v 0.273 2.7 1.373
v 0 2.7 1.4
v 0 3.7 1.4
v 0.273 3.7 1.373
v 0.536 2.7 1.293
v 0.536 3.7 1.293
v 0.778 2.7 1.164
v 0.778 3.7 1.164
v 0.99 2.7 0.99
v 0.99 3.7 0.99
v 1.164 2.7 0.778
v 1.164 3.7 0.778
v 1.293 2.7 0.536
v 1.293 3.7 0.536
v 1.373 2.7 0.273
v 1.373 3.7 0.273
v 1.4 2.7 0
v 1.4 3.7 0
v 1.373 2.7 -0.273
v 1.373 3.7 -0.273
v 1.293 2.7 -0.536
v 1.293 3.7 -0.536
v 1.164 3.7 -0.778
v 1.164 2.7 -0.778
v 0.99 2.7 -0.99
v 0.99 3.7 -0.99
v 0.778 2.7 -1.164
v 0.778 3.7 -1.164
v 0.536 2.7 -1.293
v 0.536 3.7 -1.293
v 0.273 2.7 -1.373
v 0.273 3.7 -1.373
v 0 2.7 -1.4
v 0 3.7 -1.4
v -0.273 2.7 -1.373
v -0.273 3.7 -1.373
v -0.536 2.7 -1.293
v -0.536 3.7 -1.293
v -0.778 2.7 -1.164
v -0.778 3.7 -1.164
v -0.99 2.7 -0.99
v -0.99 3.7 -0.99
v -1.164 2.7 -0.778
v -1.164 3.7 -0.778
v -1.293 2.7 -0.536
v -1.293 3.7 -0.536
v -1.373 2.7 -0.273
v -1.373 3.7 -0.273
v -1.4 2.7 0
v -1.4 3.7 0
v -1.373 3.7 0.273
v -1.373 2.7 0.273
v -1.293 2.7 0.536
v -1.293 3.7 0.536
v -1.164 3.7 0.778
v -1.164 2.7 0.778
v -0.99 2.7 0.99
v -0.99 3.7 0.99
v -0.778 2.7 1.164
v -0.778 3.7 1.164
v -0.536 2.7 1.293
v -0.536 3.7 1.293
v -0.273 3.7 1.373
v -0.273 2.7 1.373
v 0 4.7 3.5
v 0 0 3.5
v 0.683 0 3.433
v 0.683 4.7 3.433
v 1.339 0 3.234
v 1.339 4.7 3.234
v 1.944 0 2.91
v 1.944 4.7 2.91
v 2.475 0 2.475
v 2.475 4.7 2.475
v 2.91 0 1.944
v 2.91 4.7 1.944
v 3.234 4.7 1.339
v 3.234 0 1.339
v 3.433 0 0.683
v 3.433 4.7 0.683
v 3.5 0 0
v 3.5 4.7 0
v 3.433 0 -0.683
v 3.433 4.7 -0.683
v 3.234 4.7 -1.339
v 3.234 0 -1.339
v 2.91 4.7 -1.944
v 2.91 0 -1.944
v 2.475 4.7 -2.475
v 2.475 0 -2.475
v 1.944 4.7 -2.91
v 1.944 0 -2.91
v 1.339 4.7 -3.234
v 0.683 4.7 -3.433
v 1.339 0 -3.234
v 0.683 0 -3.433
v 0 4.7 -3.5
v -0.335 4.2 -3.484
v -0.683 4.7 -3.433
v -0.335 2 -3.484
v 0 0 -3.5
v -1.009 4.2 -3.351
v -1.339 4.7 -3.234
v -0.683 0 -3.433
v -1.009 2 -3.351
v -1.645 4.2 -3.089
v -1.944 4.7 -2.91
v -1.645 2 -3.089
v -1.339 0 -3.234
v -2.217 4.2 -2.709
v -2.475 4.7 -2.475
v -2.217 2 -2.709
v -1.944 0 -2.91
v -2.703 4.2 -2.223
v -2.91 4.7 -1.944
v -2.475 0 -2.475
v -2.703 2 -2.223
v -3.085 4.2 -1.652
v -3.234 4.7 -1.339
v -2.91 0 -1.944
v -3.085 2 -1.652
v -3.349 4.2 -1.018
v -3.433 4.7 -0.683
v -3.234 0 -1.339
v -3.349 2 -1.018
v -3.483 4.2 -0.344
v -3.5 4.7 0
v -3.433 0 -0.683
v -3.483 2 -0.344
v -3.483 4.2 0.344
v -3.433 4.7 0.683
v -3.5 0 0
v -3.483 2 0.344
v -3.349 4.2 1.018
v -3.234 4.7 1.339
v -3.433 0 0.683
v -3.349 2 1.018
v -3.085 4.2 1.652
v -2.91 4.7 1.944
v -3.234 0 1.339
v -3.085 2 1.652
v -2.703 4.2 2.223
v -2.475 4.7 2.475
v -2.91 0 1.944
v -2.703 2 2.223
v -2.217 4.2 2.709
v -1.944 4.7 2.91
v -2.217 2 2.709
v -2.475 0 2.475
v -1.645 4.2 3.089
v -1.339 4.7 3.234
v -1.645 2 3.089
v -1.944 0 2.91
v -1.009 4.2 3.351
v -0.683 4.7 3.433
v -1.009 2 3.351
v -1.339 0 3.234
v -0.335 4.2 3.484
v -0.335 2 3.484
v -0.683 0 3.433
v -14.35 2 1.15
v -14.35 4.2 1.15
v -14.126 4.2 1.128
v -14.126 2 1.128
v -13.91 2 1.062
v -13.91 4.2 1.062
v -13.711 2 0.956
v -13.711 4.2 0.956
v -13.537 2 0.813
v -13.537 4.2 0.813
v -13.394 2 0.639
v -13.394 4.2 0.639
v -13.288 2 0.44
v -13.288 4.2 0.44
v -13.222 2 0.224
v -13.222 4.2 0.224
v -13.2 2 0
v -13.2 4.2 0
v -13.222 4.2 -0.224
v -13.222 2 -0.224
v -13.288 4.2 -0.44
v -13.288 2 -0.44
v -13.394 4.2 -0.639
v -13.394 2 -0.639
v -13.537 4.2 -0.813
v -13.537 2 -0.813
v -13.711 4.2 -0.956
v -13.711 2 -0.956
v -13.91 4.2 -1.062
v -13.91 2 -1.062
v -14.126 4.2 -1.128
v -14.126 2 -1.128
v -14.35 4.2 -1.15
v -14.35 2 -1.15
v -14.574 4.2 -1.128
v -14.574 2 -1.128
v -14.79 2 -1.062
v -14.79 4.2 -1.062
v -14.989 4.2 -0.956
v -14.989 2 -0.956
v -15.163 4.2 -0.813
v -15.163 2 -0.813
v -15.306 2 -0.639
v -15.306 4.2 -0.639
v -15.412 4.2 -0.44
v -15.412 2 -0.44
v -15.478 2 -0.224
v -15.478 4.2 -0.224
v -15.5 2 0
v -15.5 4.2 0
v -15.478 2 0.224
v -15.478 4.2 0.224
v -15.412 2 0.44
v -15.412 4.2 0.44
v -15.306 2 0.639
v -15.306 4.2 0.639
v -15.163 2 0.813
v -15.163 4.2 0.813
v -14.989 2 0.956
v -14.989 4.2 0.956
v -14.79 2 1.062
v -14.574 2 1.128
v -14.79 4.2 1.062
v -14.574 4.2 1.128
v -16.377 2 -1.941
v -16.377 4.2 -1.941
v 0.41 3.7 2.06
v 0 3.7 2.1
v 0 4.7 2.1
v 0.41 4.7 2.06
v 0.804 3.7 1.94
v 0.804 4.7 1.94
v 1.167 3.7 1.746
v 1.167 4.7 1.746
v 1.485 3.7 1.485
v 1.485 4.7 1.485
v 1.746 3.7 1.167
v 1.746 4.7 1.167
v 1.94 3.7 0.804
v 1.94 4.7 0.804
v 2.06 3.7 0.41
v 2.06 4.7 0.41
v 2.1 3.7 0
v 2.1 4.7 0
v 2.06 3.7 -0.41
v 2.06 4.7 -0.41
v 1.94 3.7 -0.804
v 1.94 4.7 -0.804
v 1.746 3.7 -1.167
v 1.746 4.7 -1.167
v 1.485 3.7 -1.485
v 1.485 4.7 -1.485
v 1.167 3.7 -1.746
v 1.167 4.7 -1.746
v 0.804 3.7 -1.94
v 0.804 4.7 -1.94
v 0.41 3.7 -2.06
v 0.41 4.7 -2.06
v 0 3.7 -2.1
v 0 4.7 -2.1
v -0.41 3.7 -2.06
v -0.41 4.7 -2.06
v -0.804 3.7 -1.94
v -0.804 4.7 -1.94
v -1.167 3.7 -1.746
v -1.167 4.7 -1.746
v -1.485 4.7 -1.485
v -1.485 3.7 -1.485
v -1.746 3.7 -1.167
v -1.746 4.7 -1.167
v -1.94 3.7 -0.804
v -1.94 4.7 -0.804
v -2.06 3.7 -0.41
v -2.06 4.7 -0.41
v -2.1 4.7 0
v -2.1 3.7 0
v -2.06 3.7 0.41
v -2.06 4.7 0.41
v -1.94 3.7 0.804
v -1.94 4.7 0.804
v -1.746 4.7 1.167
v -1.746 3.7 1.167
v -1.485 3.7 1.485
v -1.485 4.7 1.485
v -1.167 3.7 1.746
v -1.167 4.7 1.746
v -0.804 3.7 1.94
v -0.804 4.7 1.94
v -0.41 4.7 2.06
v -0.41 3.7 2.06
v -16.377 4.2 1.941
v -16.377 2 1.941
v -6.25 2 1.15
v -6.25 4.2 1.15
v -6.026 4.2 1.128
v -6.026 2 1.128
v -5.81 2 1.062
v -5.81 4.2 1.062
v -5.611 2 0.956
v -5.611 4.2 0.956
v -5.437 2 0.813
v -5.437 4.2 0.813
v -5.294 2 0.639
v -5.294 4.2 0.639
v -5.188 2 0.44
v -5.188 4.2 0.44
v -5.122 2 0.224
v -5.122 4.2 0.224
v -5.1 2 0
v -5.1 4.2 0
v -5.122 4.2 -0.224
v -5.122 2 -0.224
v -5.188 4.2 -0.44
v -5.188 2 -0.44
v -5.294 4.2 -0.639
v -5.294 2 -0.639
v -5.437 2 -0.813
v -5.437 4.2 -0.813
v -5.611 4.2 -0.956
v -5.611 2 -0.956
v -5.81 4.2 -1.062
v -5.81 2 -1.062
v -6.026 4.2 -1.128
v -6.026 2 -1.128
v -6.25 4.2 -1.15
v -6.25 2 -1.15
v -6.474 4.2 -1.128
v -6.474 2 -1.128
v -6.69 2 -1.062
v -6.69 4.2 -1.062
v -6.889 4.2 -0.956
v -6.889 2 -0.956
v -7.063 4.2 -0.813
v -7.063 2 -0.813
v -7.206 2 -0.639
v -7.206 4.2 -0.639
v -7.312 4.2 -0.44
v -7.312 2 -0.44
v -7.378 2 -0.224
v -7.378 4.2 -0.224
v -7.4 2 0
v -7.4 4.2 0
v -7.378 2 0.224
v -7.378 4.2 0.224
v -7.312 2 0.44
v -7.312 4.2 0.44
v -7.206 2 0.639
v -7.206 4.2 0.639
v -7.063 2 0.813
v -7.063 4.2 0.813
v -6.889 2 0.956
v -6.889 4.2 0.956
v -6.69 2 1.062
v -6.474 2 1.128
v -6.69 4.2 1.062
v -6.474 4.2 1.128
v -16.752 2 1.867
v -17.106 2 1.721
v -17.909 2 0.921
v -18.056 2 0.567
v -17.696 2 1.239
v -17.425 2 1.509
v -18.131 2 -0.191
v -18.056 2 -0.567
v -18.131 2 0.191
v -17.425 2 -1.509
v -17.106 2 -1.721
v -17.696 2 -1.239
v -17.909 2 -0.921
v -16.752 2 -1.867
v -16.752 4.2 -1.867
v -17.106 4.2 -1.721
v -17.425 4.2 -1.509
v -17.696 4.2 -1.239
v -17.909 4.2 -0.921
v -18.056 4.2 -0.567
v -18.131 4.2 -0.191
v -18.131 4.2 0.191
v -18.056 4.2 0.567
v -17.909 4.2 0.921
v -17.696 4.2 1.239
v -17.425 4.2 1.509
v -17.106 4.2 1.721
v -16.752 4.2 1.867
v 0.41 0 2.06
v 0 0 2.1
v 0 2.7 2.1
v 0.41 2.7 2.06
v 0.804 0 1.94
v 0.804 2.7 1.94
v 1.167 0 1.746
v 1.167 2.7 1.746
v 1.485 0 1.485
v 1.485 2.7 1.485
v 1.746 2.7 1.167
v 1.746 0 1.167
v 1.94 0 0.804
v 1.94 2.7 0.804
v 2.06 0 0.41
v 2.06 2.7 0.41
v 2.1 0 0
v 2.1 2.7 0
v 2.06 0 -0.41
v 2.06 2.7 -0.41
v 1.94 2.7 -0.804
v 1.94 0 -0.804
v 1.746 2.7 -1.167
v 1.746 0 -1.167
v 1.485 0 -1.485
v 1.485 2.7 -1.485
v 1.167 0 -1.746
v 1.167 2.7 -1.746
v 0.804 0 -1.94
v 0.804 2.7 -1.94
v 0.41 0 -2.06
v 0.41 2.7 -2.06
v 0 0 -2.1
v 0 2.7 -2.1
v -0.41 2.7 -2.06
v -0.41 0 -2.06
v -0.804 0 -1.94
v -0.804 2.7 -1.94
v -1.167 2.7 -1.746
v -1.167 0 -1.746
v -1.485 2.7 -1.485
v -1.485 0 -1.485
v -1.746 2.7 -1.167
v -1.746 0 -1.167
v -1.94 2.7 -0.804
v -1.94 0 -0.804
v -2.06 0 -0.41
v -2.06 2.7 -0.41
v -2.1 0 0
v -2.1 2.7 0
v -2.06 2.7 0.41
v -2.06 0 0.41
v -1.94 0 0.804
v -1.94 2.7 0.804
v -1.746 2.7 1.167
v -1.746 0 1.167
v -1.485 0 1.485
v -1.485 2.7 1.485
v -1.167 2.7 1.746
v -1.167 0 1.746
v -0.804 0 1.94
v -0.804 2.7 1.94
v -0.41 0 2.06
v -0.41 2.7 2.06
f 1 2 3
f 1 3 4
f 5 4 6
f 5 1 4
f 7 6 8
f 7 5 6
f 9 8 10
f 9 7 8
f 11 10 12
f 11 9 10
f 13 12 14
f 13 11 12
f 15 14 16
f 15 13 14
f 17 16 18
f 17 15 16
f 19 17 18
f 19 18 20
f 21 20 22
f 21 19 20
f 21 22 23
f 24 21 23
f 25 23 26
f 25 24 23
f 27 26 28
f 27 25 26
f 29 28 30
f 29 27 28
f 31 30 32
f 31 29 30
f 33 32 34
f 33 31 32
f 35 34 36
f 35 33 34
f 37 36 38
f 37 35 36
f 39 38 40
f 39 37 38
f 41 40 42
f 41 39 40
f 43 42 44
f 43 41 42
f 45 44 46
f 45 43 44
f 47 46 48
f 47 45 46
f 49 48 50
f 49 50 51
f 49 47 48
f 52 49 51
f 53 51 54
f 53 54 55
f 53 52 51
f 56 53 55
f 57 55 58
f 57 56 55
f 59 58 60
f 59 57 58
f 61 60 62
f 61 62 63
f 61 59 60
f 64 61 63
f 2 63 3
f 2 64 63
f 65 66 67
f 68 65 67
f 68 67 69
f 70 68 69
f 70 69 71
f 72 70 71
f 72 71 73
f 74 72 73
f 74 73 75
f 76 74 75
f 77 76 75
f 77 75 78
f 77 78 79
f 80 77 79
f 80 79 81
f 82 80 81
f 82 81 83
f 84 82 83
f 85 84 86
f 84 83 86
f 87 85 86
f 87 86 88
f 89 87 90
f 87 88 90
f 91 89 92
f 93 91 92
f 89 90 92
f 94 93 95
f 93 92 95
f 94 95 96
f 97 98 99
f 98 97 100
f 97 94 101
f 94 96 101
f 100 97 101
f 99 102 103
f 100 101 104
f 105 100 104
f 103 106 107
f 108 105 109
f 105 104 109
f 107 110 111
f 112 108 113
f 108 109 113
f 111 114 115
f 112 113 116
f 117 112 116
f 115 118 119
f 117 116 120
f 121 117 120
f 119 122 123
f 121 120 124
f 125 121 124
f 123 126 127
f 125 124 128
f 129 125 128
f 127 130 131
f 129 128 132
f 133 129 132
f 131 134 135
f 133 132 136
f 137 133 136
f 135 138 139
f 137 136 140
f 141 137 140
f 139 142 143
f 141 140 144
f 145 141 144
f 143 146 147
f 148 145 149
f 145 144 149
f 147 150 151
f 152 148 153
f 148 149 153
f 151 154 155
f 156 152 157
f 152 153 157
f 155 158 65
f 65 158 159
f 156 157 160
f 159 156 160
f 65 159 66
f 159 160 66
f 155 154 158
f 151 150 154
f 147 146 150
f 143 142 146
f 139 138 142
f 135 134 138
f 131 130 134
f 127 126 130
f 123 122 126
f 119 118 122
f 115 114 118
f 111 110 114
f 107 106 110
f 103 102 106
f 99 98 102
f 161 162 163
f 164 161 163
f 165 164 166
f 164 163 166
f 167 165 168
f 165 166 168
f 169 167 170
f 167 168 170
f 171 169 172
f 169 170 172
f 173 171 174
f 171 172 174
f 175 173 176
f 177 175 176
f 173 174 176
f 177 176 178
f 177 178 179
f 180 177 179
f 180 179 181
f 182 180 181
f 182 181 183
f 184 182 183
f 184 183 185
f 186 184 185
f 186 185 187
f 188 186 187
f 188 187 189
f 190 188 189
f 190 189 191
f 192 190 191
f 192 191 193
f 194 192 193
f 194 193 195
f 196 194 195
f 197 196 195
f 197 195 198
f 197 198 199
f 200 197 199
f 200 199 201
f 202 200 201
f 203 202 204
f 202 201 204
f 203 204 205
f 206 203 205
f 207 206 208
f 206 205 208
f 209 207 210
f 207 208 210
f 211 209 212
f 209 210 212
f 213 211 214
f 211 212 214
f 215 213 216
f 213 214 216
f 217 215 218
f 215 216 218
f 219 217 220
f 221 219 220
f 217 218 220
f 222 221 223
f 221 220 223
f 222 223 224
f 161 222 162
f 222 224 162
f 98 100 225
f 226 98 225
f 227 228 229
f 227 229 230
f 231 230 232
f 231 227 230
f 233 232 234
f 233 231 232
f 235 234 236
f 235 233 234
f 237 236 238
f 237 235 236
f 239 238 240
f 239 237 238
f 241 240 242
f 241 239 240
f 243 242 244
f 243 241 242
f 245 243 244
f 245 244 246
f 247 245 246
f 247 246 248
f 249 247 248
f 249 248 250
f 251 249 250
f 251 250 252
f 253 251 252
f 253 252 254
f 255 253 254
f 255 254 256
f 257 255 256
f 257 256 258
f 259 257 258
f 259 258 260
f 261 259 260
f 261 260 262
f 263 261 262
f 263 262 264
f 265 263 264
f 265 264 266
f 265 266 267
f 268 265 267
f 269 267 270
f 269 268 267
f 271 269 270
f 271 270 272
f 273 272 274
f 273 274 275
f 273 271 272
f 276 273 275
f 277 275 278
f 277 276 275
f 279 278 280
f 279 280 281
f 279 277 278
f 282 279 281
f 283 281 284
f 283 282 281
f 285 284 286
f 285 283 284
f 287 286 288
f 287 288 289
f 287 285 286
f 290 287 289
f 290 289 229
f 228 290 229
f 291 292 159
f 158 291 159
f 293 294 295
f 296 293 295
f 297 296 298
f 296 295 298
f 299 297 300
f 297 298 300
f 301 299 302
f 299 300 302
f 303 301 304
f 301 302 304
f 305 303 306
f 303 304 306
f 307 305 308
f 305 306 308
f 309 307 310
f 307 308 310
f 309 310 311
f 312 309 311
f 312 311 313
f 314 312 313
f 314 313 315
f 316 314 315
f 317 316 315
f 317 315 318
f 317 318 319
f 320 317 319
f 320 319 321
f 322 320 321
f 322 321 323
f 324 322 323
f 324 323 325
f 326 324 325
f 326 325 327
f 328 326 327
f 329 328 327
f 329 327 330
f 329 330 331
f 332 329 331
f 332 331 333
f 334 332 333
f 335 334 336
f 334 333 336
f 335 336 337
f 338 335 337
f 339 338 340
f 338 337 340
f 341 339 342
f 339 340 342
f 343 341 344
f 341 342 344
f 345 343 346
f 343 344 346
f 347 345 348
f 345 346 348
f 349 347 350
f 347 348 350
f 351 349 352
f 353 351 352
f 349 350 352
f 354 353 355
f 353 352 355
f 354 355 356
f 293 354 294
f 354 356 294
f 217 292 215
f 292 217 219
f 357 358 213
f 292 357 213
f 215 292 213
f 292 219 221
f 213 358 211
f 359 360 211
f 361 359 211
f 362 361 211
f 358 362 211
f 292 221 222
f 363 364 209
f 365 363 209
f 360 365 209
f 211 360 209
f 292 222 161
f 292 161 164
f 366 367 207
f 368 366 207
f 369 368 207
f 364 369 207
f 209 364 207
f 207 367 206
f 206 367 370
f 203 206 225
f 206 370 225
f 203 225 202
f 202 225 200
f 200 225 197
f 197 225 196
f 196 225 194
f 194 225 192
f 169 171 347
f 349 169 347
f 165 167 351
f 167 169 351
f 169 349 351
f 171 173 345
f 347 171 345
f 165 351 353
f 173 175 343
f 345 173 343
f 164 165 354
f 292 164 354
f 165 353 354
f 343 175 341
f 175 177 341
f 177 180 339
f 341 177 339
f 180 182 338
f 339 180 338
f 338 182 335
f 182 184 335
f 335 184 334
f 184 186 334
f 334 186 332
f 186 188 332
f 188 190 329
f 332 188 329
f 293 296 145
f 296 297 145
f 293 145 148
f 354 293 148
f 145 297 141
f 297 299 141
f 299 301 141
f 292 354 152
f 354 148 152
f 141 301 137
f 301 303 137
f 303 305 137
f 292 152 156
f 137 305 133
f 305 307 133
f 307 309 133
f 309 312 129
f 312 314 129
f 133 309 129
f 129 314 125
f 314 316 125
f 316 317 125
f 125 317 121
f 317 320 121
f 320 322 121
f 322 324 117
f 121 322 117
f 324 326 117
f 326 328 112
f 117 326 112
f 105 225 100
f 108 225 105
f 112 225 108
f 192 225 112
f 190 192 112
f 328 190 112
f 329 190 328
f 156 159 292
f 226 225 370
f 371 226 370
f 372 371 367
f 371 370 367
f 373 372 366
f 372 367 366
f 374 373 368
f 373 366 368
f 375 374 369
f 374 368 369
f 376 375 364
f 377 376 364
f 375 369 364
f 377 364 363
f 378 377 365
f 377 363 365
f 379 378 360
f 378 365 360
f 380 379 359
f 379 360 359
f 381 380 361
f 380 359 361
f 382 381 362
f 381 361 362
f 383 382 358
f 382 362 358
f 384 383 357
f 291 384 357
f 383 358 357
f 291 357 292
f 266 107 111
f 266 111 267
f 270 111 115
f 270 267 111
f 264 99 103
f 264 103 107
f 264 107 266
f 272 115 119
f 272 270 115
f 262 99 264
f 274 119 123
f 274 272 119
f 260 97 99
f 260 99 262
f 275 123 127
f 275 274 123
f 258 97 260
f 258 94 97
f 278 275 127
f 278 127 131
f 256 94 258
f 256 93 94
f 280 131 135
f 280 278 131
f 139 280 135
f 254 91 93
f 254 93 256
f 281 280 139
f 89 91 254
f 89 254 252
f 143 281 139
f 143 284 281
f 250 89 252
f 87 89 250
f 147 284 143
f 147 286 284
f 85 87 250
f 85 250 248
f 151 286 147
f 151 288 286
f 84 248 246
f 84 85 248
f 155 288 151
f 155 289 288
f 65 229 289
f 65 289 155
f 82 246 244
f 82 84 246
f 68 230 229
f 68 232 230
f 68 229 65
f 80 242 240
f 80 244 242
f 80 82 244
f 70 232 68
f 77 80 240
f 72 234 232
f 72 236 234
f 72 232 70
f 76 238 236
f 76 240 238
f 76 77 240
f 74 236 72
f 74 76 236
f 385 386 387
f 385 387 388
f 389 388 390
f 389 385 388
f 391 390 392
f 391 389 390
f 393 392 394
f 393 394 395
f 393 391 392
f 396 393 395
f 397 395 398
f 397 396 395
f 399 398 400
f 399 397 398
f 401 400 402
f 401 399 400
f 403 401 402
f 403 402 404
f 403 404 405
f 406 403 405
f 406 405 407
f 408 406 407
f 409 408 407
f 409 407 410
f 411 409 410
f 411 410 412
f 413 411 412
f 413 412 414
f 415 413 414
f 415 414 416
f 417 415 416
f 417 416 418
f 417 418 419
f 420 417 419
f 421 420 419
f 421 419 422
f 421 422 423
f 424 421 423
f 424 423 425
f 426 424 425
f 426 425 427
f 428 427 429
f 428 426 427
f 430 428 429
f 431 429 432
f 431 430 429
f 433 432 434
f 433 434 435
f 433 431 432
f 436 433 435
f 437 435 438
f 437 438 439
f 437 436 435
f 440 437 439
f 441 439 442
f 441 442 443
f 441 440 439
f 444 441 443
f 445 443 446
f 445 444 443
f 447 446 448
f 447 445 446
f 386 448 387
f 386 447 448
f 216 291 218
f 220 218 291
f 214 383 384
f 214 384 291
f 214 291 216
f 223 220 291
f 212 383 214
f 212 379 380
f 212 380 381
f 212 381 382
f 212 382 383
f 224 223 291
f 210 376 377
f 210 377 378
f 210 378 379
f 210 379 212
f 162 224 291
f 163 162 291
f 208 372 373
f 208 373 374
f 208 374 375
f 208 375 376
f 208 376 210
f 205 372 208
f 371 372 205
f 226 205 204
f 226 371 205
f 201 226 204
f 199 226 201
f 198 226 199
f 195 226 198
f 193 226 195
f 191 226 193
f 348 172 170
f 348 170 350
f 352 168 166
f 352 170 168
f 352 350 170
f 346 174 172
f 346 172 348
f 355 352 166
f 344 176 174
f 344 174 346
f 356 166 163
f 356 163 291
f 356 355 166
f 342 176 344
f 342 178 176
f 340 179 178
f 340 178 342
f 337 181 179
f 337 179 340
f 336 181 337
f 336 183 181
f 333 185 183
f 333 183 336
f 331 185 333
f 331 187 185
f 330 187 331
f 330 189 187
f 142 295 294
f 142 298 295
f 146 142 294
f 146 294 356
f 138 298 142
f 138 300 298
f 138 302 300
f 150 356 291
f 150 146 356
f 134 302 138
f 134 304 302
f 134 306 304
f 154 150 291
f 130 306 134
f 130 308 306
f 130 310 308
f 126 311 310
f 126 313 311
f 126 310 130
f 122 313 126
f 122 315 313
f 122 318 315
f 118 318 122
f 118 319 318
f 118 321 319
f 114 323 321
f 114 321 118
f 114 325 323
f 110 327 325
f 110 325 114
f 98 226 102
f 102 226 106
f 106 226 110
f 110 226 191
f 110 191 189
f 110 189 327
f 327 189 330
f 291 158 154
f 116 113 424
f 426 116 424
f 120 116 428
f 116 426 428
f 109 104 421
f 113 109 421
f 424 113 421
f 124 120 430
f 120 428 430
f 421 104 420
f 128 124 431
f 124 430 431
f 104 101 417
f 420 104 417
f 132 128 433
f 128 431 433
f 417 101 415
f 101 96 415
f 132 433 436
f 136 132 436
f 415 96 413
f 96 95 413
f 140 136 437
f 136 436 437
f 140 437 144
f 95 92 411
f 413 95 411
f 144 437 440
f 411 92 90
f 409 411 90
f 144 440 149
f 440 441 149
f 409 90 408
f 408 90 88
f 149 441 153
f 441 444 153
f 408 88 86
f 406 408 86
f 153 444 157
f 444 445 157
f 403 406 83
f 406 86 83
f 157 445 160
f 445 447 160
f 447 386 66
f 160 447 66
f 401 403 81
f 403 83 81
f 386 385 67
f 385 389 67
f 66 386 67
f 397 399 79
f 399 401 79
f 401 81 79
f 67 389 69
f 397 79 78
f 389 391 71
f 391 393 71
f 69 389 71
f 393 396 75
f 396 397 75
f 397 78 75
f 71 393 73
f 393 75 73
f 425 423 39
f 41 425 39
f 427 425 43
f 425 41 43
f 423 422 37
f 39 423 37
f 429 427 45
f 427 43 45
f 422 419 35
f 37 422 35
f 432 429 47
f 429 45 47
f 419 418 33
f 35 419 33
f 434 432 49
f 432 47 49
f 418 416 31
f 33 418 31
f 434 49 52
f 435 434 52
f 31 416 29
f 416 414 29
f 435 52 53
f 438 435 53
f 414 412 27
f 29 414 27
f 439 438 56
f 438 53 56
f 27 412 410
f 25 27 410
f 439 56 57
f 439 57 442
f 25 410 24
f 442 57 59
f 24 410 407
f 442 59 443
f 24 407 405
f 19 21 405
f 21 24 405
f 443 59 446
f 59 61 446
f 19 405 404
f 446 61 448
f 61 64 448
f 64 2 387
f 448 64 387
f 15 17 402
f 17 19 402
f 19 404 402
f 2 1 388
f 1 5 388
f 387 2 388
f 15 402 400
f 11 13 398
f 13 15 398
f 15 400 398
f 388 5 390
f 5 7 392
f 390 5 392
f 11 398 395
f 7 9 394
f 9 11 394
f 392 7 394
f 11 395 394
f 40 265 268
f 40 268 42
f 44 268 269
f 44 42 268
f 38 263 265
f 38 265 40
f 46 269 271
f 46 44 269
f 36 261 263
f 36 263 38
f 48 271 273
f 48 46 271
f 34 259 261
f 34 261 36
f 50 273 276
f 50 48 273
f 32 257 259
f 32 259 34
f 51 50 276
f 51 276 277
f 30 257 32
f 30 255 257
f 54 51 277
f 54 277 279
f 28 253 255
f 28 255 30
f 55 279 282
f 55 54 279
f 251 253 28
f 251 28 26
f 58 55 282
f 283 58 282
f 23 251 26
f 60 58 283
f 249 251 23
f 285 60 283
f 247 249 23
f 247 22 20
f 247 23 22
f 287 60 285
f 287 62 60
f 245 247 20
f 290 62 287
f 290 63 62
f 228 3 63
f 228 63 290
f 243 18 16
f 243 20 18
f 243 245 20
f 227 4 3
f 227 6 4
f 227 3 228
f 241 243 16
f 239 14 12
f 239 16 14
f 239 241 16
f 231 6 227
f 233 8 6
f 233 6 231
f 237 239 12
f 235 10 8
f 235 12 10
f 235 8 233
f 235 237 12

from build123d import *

# Parameters (mm, degrees)
SKETCH1_R           = 3.5
SKETCH1_R_2         = 2.1
BOSS_EXTRUDE1_DEPTH = 4.7
BOSS_EXTRUDE2_START = -2
SKETCH3_R           = 2.1
SKETCH3_R_2         = 1.4
BOSS_EXTRUDE2_DEPTH = 1
BOSS_EXTRUDE3_START = -2.7
BOSS_EXTRUDE3_DEPTH = 2.2
CUT_EXTRUDE1_REACH  = 20.946
SKETCH5_R           = 1.15


with BuildPart() as part:
    # Sketch1 → Boss-Extrude1 (new body)
    with BuildSketch(Plane(origin=(0, 0, 0), x_dir=(1, 0, 0), z_dir=(0, 1, 0))):
        with Locations(Location((0, 0, 0), (0, 0, 270))):
            Circle(SKETCH1_R)
        with Locations(Location((0, 0, 0), (0, 0, 270))):
            Circle(SKETCH1_R_2, mode=Mode.SUBTRACT)
    extrude(amount=BOSS_EXTRUDE1_DEPTH)

    # Sketch3 → Boss-Extrude2 (add)
    with BuildSketch(Plane(origin=(0, 4.7, 0), x_dir=(1, 0, 0), z_dir=(0, 1, 0)).offset(BOSS_EXTRUDE2_START)):
        with Locations(Location((0, 0, 0), (0, 0, 270))):
            Circle(SKETCH3_R)
        with Locations(Location((0, 0, 0), (0, 0, 270))):
            Circle(SKETCH3_R_2, mode=Mode.SUBTRACT)
    extrude(amount=BOSS_EXTRUDE2_DEPTH)

    # Sketch4 → Boss-Extrude3 (add)
    with BuildSketch(Plane(origin=(0, 4.7, 0), x_dir=(1, 0, 0), z_dir=(0, 1, 0)).offset(BOSS_EXTRUDE3_START)):
        with BuildLine():
            Line((-0.335083385, 3.483922951), (-16.376689314, 1.941042787))
            ThreePointArc((-16.376689314, 1.941042787), (-18.14, 0), (-16.376689314, -1.941042787))
            Line((-16.376689314, -1.941042787), (-0.335083385, -3.483922951))
            ThreePointArc((-0.335083385, -3.483922951), (-3.5, 0), (-0.335083385, 3.483922951))
        make_face()
    extrude(amount=BOSS_EXTRUDE3_DEPTH)

    # Sketch5 → Cut-Extrude1 (cut, up to next)
    with BuildSketch(Plane(origin=(0, 4.2, 0), x_dir=(1, 0, 0), z_dir=(0, 1, 0)), mode=Mode.PRIVATE) as cut_extrude1_sk1:
        with Locations(Location((-14.35, 0, 0), (0, 0, 270))):
            Circle(SKETCH5_R)
    cut_extrude1_tool1 = extrude(cut_extrude1_sk1.sketch, amount=-CUT_EXTRUDE1_REACH, mode=Mode.PRIVATE) & part.part
    # Sketch5 → Cut-Extrude1 (cut, up to next)
    with BuildSketch(Plane(origin=(0, 4.2, 0), x_dir=(1, 0, 0), z_dir=(0, 1, 0)), mode=Mode.PRIVATE) as cut_extrude1_sk2:
        with Locations(Location((-6.25, 0, 0), (0, 0, 270))):
            Circle(SKETCH5_R)
    cut_extrude1_tool2 = extrude(cut_extrude1_sk2.sketch, amount=-CUT_EXTRUDE1_REACH, mode=Mode.PRIVATE) & part.part
    add(cut_extrude1_tool1.solids().sort_by_distance((-14.35, 4.2, 0))[0], mode=Mode.SUBTRACT)
    add(cut_extrude1_tool2.solids().sort_by_distance((-6.25, 4.2, 0))[0], mode=Mode.SUBTRACT)


solid = part.part
